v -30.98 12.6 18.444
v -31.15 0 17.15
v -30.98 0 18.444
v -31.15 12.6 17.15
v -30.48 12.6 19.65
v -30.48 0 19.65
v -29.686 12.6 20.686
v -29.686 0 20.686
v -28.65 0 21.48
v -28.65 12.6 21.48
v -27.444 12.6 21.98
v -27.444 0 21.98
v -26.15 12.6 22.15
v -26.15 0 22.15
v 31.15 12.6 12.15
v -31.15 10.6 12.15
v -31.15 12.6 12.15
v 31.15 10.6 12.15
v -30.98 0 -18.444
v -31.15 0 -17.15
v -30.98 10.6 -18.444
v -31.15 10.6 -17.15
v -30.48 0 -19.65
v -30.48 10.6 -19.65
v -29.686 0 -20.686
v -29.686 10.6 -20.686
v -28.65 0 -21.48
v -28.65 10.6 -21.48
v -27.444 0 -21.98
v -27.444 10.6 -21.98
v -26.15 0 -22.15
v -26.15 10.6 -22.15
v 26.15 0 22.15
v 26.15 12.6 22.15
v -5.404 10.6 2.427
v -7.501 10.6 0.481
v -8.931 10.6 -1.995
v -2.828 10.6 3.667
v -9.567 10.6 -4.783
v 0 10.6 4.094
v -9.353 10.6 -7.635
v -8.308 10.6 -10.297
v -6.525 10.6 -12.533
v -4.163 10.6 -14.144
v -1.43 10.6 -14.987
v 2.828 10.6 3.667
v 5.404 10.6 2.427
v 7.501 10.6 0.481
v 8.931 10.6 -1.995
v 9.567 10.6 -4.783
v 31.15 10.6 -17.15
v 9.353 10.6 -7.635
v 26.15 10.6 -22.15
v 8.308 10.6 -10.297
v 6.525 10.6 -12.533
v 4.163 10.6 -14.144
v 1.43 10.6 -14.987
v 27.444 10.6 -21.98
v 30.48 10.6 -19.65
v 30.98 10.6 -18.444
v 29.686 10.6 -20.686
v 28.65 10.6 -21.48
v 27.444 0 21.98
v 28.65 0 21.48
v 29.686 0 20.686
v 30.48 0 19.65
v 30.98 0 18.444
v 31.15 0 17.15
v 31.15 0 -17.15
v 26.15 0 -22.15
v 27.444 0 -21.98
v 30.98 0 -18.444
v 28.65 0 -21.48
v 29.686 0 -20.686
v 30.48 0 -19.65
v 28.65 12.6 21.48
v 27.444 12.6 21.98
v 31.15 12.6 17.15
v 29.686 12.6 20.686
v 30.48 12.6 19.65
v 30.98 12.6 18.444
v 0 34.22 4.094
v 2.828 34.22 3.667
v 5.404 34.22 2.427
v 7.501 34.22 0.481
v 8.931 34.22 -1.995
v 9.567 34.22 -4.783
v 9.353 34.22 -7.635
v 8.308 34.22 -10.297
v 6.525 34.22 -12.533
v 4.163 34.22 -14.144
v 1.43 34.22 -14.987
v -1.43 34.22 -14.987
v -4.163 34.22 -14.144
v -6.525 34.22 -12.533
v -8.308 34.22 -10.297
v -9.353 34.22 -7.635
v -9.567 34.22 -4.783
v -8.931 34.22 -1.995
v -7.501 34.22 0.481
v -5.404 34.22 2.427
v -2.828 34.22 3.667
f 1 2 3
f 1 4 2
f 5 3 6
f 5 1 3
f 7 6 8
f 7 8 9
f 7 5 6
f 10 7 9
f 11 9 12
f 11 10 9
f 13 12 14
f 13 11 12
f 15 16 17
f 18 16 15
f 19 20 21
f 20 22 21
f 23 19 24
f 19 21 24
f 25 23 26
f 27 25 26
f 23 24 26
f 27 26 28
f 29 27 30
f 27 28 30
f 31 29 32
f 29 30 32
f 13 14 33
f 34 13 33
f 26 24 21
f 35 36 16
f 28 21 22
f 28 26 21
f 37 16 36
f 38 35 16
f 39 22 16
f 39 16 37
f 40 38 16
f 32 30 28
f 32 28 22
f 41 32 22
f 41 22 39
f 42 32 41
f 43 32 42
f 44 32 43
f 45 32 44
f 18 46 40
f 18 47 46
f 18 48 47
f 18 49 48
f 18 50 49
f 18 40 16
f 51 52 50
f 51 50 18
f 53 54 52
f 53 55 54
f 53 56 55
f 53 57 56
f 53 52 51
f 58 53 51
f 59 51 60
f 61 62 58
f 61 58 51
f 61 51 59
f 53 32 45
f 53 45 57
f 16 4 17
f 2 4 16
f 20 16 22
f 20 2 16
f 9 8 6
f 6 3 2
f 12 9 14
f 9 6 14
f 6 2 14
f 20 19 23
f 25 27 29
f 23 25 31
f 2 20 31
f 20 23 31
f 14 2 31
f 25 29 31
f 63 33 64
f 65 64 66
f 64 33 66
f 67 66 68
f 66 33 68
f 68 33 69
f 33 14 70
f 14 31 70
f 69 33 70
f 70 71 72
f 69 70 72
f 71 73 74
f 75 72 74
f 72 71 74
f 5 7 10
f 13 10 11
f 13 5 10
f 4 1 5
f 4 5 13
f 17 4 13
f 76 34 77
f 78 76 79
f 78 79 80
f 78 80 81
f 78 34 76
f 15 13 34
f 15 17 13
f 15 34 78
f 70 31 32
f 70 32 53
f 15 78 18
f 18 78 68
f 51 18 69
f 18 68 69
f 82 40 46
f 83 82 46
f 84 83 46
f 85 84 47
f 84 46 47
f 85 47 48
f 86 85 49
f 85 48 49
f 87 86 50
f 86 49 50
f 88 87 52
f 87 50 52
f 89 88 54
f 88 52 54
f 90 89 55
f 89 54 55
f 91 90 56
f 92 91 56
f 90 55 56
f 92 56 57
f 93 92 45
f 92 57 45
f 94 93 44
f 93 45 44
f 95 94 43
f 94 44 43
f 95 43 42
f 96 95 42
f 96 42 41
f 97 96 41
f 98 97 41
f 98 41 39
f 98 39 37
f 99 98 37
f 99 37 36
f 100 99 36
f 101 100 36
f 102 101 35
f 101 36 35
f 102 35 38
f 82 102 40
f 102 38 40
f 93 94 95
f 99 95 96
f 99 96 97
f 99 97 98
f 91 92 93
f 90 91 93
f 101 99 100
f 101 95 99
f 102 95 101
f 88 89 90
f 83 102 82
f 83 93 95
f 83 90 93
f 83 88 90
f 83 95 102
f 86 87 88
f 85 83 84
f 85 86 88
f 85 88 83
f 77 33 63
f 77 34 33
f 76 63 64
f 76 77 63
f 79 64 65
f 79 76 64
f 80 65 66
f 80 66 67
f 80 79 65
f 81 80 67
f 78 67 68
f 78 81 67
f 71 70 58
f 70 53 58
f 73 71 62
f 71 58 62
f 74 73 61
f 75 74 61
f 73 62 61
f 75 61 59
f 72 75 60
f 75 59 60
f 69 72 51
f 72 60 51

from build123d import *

# Parameters (mm, degrees)
SKETCH_1_W      = 62.3
SKETCH_1_H      = 34.3
EXTRUDE_1_DEPTH = 10.6
SKETCH_1_3_W    = 62.3
SKETCH_1_3_H    = 10
EXTRUDE_2_DEPTH = 12.6
SKETCH_4_R      = 9.593725323
EXTRUDE_3_DEPTH = 23.62
FILLET_1_R      = 5


with BuildPart() as part:
    # 草图1 → 凸台-拉伸1 (new body)
    with BuildSketch(Plane(origin=(0, 0, 0), x_dir=(1, 0, 0), z_dir=(0, 1, 0))):
        with Locations((0, 5)):
            Rectangle(SKETCH_1_W, SKETCH_1_H)
    extrude(amount=EXTRUDE_1_DEPTH)

    # 草图1<3> → 凸台-拉伸2 (add)
    with BuildSketch(Plane(origin=(0, 0, 0), x_dir=(1, 0, 0), z_dir=(0, 1, 0))):
        with Locations((0, -17.15)):
            Rectangle(SKETCH_1_3_W, SKETCH_1_3_H)
    extrude(amount=EXTRUDE_2_DEPTH)

    # 草图4 → 凸台-拉伸3 (add)
    with BuildSketch(Plane(origin=(0, 10.6, 0), x_dir=(1, 0, 0), z_dir=(0, 1, 0))):
        with Locations((0, 5.500207834)):
            Circle(SKETCH_4_R)
    extrude(amount=EXTRUDE_3_DEPTH)

    # 圆角1
    fillet_1_edges = [part.edges().sort_by_distance(p)[0] for p in [
        (-31.15, 6.3, 22.15),
        (-31.15, 5.3, -22.15),
        (31.15, 6.3, 22.15),
        (31.15, 5.3, -22.15),
    ]]
    fillet(fillet_1_edges, radius=FILLET_1_R)


solid = part.part
